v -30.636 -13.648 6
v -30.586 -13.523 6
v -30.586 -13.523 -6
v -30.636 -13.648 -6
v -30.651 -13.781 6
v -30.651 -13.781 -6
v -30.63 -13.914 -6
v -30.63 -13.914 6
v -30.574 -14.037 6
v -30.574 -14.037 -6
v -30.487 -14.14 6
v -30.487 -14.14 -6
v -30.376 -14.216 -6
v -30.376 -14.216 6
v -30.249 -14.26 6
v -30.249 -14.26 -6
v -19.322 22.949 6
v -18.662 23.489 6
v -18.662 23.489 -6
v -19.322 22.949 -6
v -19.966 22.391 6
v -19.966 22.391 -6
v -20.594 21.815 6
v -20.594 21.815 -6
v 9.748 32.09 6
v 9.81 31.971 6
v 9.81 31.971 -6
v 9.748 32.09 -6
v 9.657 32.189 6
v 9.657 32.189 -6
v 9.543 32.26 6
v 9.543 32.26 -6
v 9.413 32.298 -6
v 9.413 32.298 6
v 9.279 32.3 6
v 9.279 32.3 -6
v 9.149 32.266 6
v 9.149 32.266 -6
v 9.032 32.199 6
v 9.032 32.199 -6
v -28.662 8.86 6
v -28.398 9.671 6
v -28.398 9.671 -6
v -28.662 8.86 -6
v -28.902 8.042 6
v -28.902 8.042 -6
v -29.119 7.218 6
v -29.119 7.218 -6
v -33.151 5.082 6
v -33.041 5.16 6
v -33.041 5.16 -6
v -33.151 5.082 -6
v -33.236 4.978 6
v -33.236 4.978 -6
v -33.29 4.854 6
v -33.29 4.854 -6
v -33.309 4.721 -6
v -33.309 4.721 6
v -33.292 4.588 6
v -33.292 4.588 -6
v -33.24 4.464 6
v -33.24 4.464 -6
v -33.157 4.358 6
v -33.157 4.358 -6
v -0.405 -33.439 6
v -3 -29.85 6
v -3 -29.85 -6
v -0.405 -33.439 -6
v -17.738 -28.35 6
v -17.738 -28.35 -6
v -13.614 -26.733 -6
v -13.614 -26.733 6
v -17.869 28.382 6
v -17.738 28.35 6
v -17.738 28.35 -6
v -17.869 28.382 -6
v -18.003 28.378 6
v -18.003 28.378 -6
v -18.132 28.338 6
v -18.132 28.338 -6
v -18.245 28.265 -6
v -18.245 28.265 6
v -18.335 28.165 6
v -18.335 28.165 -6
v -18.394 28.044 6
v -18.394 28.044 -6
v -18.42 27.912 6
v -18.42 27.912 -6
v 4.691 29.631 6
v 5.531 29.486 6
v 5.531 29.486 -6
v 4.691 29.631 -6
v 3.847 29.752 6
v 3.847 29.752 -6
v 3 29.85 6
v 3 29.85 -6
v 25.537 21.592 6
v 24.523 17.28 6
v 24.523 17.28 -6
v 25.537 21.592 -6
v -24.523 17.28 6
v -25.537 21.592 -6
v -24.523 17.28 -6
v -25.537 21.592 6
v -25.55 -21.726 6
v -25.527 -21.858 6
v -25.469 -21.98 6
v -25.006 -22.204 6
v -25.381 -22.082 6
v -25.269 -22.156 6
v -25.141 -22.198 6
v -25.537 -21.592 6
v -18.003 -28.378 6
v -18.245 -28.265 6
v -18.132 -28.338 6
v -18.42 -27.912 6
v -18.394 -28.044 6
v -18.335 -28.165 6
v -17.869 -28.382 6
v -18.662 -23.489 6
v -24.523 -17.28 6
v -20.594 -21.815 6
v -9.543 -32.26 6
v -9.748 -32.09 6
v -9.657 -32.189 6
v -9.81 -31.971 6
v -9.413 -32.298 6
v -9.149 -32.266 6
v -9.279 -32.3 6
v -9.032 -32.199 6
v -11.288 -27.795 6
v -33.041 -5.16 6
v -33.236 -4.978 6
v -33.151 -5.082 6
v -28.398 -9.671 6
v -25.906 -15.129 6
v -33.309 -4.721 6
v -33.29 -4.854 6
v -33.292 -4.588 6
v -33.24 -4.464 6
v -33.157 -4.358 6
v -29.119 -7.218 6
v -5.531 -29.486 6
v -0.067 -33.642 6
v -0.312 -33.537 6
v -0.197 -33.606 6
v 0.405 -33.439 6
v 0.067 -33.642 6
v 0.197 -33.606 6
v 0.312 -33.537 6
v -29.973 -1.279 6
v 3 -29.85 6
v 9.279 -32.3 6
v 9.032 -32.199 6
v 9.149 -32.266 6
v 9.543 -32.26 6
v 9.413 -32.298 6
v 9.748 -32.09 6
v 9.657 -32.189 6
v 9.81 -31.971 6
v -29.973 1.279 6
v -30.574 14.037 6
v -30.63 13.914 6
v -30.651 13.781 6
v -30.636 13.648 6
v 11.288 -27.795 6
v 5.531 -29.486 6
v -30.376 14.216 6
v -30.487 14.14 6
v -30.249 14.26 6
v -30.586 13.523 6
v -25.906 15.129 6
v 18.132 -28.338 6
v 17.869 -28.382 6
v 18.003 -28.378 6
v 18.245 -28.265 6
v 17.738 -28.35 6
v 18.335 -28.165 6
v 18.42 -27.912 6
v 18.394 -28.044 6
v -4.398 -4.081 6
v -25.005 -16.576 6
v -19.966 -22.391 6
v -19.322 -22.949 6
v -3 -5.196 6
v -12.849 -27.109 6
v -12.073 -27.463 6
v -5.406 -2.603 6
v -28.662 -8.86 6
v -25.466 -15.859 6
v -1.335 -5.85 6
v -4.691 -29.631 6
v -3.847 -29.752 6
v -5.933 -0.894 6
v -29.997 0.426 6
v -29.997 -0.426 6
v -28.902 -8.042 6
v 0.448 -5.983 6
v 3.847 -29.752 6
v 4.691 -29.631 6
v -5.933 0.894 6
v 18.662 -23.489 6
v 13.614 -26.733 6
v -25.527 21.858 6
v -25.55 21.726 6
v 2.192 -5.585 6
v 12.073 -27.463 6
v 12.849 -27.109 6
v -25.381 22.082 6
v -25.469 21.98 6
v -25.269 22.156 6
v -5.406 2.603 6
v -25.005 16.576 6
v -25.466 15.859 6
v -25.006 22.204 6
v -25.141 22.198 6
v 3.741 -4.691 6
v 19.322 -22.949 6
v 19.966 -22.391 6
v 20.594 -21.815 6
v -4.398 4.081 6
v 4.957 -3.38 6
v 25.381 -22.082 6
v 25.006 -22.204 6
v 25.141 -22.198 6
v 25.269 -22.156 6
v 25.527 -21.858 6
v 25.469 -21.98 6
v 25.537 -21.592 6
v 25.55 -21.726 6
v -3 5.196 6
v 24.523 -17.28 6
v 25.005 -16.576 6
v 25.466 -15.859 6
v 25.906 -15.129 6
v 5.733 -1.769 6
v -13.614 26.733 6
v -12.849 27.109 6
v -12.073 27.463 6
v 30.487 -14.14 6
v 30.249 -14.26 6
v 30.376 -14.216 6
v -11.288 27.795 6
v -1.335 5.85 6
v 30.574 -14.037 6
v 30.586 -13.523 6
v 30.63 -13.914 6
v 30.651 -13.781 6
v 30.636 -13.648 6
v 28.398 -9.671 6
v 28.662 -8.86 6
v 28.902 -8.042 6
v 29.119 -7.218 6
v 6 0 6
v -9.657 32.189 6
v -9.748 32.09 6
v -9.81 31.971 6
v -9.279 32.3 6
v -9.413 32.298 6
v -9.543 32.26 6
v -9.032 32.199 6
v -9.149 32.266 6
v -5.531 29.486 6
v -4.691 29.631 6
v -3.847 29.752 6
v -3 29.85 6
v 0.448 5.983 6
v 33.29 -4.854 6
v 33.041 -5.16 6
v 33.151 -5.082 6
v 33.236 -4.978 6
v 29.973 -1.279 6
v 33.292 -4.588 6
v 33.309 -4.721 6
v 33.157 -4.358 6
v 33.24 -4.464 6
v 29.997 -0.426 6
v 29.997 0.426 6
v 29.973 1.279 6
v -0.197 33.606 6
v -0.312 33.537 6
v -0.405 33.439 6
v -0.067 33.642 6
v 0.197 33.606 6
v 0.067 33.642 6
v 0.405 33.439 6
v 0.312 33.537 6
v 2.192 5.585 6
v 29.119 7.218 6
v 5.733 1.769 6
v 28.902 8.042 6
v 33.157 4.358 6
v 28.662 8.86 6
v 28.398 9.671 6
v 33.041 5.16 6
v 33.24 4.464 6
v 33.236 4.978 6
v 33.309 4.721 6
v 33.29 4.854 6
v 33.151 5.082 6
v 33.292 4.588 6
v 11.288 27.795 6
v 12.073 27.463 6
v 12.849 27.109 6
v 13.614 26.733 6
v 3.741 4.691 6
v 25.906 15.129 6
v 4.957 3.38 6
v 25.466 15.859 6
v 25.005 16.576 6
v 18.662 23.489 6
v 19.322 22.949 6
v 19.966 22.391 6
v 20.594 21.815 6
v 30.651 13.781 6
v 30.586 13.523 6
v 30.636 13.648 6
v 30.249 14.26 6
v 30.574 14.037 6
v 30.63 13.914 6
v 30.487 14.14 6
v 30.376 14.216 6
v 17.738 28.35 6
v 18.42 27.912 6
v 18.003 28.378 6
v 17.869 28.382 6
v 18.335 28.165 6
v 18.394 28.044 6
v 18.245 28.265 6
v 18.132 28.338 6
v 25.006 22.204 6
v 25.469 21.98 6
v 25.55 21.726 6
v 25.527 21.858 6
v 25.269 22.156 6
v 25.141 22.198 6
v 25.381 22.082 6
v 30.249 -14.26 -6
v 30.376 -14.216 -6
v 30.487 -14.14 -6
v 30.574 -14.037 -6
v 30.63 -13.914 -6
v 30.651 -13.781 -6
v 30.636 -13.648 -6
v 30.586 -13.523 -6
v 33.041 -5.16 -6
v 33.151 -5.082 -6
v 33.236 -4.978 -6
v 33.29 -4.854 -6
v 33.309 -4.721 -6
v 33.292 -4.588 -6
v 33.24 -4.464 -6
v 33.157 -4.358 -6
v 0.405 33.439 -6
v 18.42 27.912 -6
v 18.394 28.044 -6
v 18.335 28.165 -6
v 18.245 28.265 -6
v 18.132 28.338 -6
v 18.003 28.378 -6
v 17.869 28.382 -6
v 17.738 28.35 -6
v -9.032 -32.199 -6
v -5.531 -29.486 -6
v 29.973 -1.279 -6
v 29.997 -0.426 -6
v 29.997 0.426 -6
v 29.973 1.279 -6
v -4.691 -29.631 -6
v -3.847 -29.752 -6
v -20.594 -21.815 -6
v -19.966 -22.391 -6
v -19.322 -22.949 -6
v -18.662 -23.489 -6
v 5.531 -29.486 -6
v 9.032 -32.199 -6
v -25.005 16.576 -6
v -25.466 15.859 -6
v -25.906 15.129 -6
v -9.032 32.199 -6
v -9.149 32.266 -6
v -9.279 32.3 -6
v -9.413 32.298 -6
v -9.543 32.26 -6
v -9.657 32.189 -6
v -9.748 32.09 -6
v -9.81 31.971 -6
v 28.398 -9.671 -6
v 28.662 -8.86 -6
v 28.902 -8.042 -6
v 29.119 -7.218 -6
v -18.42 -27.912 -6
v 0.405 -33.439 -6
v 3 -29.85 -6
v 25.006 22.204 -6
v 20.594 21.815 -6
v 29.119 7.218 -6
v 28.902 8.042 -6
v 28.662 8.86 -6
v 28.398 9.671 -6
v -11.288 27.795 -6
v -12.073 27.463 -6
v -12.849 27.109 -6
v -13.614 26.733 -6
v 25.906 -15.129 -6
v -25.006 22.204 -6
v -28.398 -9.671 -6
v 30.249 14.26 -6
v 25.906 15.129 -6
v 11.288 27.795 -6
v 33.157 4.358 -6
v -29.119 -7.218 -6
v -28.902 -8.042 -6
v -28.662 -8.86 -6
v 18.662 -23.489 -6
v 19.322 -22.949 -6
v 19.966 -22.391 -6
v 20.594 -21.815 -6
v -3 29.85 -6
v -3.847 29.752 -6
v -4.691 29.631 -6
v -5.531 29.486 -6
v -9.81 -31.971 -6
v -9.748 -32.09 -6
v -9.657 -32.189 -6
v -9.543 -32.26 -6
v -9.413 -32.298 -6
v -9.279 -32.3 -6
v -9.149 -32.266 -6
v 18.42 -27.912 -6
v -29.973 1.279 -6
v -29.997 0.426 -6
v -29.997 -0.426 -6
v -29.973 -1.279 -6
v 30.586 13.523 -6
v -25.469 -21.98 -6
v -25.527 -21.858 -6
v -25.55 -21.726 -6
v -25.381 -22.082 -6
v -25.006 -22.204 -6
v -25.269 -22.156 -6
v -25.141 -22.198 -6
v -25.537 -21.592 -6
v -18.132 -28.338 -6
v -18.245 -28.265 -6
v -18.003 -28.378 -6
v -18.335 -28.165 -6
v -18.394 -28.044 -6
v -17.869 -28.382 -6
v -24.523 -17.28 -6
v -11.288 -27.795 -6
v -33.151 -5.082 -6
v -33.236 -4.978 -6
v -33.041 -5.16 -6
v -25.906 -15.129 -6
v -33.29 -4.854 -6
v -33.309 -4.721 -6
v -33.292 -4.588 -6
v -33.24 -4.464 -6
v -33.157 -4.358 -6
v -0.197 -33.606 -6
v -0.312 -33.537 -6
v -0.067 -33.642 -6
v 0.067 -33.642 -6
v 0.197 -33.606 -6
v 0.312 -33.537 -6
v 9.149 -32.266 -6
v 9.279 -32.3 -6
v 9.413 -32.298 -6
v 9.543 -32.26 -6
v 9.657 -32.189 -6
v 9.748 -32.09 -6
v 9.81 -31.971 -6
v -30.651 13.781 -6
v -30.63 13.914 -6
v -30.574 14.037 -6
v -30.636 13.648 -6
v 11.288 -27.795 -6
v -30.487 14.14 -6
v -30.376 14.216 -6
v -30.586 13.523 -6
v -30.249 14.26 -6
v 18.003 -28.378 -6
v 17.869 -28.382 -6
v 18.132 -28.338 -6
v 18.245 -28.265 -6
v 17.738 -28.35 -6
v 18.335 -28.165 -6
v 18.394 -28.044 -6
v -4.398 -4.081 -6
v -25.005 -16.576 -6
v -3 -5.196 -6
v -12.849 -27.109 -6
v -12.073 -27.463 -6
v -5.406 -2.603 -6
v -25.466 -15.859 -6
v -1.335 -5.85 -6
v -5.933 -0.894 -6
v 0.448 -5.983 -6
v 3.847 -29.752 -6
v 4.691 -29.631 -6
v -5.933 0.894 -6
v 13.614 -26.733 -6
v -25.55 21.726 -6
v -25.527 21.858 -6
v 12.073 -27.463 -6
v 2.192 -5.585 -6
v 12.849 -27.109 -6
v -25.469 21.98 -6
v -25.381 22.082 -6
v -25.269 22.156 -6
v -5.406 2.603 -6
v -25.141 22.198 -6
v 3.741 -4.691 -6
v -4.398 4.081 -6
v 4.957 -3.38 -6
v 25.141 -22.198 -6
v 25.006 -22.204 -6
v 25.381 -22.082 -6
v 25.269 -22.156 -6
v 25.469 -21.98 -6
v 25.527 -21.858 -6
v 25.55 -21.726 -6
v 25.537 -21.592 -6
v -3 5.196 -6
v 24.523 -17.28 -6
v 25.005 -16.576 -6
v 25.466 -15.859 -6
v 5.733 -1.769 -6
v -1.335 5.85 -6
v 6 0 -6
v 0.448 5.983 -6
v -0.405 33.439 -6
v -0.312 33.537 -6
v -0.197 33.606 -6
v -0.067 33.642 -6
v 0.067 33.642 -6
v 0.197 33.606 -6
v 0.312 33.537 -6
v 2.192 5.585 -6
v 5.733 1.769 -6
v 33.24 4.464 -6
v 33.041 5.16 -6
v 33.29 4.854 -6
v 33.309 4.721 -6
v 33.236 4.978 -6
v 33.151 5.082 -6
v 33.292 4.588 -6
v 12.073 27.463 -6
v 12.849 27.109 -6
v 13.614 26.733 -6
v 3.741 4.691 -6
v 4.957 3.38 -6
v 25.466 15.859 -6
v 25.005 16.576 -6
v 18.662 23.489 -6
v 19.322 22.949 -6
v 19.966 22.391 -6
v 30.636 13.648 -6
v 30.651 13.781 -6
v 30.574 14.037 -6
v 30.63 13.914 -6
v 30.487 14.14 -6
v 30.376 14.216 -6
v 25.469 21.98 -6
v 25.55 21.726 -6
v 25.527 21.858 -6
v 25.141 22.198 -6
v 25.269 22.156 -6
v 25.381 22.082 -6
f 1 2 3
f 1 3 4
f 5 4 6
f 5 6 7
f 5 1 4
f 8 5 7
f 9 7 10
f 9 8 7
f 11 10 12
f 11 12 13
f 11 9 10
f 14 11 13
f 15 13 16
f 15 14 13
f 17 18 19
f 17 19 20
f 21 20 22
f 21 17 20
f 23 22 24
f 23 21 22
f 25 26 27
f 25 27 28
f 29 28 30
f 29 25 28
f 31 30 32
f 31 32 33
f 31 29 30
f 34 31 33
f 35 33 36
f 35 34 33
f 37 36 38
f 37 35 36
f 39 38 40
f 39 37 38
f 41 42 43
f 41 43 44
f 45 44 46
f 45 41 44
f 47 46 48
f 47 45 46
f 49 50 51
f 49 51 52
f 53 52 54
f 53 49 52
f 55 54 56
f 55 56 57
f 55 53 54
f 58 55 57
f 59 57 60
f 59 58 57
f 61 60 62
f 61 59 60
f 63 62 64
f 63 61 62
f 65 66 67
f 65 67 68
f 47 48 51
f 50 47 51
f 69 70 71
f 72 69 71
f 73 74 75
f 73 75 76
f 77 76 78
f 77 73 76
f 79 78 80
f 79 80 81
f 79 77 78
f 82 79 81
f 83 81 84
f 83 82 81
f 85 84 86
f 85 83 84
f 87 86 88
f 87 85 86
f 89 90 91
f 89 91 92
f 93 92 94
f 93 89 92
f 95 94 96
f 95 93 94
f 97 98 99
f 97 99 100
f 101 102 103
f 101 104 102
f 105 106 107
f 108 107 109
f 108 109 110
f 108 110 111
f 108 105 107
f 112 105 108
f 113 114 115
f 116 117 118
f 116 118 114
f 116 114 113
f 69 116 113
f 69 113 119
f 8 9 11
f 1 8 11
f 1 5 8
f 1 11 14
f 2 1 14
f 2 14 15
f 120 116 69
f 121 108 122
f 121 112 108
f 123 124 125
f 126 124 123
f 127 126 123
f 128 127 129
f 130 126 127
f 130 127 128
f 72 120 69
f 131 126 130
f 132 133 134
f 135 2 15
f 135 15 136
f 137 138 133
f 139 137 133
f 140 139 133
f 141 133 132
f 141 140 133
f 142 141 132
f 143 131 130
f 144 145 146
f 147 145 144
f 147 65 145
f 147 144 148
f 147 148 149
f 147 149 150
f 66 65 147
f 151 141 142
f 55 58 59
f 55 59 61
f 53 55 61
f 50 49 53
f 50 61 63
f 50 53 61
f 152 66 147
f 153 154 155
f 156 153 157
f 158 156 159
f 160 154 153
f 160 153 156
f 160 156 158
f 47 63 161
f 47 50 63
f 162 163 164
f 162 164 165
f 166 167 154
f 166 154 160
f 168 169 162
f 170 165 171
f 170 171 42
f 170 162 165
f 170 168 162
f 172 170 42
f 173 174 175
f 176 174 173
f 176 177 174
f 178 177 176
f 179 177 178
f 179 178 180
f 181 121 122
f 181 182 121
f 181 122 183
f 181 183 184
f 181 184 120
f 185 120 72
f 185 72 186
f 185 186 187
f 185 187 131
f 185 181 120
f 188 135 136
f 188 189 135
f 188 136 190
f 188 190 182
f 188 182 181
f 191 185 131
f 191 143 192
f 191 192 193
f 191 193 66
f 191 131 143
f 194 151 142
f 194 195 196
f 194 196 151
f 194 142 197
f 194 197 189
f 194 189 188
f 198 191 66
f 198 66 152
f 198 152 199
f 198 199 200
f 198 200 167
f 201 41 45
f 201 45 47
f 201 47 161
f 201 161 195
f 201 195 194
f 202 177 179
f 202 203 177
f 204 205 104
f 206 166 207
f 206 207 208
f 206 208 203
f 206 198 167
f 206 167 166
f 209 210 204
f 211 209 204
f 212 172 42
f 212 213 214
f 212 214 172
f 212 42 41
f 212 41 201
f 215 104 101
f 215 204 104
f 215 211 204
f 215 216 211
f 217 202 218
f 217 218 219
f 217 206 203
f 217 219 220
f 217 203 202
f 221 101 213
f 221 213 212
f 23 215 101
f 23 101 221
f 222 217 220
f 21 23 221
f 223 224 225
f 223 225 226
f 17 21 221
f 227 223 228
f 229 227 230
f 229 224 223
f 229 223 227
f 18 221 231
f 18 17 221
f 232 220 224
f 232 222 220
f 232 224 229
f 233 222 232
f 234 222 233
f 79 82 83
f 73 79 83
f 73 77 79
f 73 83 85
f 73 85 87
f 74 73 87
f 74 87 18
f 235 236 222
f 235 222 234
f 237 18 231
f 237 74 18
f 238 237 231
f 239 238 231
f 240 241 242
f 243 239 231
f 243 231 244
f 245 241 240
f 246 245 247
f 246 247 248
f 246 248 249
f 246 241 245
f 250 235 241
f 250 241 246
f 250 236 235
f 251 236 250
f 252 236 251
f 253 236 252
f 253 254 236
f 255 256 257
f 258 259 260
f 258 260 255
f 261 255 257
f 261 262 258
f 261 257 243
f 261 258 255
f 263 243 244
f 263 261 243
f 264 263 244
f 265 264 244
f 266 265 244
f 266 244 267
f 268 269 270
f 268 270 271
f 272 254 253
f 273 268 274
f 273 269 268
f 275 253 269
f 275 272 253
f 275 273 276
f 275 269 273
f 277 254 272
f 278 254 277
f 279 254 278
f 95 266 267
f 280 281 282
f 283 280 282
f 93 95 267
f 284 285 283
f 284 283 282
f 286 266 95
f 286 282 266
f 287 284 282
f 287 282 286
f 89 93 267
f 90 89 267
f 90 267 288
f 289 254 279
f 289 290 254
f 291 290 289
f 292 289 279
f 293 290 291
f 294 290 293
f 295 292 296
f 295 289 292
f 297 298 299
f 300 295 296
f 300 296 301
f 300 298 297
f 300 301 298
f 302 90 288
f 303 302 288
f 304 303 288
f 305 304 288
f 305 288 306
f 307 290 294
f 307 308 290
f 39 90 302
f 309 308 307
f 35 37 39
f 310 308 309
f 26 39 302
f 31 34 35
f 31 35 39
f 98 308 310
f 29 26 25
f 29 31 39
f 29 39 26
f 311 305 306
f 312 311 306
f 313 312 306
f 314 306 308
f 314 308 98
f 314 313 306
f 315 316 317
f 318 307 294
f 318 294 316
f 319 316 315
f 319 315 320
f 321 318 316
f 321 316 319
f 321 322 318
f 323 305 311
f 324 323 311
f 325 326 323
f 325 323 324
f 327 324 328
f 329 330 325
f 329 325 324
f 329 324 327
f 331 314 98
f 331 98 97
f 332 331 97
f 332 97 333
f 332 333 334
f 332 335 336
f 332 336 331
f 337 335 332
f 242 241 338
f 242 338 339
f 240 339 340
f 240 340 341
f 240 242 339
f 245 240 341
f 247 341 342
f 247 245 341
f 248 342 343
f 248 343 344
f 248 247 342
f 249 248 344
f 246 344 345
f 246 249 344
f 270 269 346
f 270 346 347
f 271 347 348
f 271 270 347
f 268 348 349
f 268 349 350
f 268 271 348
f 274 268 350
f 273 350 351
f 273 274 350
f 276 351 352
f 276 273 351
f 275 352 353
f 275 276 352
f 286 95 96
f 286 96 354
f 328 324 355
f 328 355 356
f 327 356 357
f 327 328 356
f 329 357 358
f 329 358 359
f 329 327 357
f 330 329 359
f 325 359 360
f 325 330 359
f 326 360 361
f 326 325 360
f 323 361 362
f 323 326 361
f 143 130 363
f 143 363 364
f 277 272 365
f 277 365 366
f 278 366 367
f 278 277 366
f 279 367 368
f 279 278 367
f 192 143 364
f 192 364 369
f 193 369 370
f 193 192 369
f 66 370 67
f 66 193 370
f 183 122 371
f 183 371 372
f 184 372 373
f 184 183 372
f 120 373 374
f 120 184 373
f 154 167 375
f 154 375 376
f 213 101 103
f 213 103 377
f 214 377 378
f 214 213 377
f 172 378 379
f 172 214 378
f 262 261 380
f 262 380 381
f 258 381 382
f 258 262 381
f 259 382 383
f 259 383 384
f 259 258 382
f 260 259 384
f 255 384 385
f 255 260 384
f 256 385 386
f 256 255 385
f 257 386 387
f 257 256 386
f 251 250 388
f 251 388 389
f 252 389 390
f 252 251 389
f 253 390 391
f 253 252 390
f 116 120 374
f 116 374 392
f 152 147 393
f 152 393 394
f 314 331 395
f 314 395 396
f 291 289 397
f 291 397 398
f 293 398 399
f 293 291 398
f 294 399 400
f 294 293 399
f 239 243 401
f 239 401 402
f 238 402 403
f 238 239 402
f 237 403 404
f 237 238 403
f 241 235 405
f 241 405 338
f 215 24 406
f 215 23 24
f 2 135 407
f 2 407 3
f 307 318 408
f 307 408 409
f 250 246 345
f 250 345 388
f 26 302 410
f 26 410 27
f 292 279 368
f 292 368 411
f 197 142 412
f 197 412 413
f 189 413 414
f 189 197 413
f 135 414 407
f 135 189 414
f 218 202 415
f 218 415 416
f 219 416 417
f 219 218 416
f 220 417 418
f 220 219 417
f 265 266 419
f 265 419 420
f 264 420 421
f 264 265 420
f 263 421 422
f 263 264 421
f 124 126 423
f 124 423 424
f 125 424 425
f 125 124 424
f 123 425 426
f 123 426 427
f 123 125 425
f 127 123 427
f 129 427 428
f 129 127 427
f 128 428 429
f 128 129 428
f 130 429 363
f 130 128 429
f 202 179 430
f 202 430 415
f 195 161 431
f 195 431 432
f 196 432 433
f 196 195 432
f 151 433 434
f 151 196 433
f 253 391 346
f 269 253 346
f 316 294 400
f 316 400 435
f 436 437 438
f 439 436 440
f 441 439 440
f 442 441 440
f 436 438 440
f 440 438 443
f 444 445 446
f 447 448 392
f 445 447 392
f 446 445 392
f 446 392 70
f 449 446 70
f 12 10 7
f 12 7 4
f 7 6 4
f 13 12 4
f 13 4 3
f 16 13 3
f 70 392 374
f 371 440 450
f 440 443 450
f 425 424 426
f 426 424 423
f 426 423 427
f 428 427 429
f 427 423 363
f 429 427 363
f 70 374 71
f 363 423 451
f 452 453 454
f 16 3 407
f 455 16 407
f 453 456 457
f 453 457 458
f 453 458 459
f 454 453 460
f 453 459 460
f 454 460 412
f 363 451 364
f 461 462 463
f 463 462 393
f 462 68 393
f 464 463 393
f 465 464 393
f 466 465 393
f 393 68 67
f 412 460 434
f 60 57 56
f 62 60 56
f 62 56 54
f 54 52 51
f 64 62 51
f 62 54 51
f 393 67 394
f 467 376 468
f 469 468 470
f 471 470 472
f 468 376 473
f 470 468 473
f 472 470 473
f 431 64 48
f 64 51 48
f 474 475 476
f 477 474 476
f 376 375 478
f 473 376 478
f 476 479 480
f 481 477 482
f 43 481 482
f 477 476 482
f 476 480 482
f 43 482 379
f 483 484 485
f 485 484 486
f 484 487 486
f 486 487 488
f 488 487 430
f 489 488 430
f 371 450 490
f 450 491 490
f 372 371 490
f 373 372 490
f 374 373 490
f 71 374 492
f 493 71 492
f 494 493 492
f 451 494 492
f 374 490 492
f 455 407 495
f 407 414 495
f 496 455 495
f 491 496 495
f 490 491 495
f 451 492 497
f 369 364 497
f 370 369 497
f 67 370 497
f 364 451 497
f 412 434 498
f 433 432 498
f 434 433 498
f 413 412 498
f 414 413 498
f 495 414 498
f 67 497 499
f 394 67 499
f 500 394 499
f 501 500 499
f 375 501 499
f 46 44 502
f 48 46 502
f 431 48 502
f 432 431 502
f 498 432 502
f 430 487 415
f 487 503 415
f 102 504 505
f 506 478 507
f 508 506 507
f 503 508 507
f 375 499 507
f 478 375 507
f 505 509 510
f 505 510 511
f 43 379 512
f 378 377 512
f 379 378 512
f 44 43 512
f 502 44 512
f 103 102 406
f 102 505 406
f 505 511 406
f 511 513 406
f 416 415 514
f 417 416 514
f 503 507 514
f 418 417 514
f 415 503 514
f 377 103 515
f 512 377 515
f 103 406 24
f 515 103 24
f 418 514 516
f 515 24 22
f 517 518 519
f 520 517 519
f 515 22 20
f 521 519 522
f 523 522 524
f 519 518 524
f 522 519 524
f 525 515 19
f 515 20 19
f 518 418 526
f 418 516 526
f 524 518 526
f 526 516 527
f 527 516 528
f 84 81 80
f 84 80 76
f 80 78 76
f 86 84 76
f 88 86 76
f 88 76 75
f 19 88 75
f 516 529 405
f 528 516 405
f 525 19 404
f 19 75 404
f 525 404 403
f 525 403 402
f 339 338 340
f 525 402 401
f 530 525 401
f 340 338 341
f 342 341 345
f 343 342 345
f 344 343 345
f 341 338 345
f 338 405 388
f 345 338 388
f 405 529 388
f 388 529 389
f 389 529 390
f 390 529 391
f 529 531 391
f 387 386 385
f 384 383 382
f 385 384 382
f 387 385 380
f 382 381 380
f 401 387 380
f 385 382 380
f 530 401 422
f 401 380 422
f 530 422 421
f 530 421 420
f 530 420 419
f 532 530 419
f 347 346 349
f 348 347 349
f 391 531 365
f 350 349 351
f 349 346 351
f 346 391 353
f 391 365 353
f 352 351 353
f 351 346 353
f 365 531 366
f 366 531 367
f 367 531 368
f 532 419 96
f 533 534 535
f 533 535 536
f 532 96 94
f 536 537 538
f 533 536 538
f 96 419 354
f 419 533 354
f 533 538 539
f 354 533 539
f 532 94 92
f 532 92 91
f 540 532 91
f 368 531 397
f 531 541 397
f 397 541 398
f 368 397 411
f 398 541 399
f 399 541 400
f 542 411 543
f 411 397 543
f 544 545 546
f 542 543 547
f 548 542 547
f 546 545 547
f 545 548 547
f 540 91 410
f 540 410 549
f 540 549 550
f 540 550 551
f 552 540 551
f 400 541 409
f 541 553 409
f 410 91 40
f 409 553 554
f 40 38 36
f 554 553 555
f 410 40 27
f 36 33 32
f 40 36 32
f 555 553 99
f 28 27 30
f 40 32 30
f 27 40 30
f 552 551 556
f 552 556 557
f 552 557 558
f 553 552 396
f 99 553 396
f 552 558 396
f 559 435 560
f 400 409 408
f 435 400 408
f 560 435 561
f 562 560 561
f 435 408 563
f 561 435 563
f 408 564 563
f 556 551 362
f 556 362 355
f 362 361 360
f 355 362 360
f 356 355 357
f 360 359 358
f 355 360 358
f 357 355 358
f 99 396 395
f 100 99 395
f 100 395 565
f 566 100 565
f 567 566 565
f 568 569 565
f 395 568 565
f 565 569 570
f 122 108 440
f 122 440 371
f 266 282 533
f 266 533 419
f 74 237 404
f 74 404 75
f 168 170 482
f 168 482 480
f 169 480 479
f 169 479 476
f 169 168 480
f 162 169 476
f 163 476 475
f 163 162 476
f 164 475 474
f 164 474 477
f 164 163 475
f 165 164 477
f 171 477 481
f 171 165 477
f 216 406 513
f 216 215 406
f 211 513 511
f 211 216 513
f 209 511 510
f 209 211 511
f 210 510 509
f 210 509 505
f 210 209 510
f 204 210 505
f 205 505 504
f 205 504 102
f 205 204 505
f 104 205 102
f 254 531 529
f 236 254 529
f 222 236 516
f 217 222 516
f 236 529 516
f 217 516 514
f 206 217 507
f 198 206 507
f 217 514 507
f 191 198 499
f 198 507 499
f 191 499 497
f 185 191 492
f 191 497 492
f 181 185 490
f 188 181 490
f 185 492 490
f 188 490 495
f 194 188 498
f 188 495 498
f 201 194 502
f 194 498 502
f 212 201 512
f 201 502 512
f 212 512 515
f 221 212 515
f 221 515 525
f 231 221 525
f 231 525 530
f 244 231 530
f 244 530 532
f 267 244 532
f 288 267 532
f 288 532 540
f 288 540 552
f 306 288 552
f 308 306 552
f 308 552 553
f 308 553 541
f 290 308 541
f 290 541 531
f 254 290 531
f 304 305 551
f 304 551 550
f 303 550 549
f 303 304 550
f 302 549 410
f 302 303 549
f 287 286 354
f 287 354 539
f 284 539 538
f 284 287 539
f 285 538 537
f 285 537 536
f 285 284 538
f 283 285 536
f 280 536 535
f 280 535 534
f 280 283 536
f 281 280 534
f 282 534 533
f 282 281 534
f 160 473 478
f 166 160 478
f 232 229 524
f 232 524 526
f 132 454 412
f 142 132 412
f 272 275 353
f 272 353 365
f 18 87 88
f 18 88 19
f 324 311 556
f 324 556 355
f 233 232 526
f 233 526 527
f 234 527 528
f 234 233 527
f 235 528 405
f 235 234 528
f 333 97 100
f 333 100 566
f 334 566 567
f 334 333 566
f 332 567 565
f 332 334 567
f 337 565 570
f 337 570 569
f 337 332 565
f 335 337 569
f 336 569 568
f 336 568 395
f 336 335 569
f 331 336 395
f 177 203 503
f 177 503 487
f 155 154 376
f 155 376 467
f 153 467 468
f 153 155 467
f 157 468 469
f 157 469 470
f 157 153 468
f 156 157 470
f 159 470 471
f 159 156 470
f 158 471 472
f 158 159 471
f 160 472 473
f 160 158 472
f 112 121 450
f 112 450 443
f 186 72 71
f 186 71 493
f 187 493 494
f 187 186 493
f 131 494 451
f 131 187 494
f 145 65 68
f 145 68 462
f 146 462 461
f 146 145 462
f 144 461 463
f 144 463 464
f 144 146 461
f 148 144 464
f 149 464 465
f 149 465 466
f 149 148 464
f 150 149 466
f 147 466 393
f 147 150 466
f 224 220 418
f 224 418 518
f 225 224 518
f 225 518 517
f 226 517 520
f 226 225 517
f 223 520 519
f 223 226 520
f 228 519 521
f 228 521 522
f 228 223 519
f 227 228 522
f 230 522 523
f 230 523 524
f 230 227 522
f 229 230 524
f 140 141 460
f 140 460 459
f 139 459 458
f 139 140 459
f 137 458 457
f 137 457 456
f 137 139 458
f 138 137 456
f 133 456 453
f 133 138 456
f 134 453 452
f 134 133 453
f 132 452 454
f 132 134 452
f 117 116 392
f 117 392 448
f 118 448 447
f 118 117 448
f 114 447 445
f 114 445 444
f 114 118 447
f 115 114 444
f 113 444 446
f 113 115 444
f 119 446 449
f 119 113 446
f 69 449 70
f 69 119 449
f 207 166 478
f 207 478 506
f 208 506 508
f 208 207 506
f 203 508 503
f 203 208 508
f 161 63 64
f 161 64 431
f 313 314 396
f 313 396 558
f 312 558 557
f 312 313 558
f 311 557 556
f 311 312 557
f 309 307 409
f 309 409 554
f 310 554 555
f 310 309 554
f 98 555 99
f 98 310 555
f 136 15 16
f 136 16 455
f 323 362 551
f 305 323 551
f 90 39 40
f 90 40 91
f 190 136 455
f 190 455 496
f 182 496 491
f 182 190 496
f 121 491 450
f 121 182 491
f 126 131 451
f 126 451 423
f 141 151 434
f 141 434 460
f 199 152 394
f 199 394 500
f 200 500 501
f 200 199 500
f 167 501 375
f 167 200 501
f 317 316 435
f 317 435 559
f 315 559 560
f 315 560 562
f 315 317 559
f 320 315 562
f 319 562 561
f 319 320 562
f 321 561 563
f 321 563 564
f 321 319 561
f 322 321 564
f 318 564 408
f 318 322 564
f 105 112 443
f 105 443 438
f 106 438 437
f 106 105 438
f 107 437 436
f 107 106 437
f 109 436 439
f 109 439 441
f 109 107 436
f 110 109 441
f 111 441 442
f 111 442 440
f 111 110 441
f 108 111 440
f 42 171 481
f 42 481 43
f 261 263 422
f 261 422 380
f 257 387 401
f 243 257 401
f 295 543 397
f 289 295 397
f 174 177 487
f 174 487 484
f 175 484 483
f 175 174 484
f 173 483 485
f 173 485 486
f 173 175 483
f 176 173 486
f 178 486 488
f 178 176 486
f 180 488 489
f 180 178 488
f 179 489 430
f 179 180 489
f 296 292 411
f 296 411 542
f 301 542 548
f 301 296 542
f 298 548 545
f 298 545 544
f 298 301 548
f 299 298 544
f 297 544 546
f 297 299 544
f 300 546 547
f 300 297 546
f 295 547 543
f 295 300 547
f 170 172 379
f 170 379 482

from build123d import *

# Parameters (mm, degrees)
F1_DEPTH = 6
F2_R     = 6
F3_DEPTH = 25


with BuildPart() as f1:
    # F0 (on Top) → F1 (new body, symmetric)
    with BuildSketch(Plane.XY):
        with BuildLine():
            Line((-25.53717, 21.591896), (-24.523422, 17.280097))
            ThreePointArc((-24.523422, 17.280097), (-25.237606, 16.219225), (-25.905927, 15.128878))
            Line((-25.905927, 15.128878), (-30.249203, 14.259829))
            ThreePointArc((-30.249203, 14.259829), (-30.605918, 13.977255), (-30.585875, 13.52262))
            Line((-30.585875, 13.52262), (-28.398417, 9.671086))
            ThreePointArc((-28.398417, 9.671086), (-28.784789, 8.451977), (-29.118852, 7.217509))
            Line((-29.118852, 7.217509), (-33.041356, 5.16002))
            ThreePointArc((-33.041356, 5.16002), (-33.304011, 4.788394), (-33.156694, 4.357822))
            Line((-33.156694, 4.357822), (-29.972742, 1.27858))
            ThreePointArc((-29.972742, 1.27858), (-30, 0), (-29.972742, -1.27858))
            Line((-29.972742, -1.27858), (-33.156694, -4.357822))
            ThreePointArc((-33.156694, -4.357822), (-33.304011, -4.788394), (-33.041356, -5.16002))
            Line((-33.041356, -5.16002), (-29.118852, -7.217509))
            ThreePointArc((-29.118852, -7.217509), (-28.784789, -8.451977), (-28.398417, -9.671086))
            Line((-28.398417, -9.671086), (-30.585875, -13.52262))
            ThreePointArc((-30.585875, -13.52262), (-30.605918, -13.977255), (-30.249203, -14.259829))
            Line((-30.249203, -14.259829), (-25.905927, -15.128878))
            ThreePointArc((-25.905927, -15.128878), (-25.237606, -16.219225), (-24.523422, -17.280097))
            Line((-24.523422, -17.280097), (-25.53717, -21.591896))
            ThreePointArc((-25.53717, -21.591896), (-25.428316, -22.033761), (-25.00644, -22.204391))
            Line((-25.00644, -22.204391), (-20.594258, -21.814595))
            ThreePointArc((-20.594258, -21.814595), (-19.645822, -22.672487), (-18.661685, -23.489178))
            Line((-18.661685, -23.489178), (-18.419595, -27.911925))
            ThreePointArc((-18.419595, -27.911925), (-18.190663, -28.305223), (-17.737803, -28.350085))
            Line((-17.737803, -28.350085), (-13.614164, -26.733023))
            ThreePointArc((-13.614164, -26.733023), (-12.46245, -27.28896), (-11.28809, -27.795306))
            Line((-11.28809, -27.795306), (-9.809774, -31.970695))
            ThreePointArc((-9.809774, -31.970695), (-9.47931, -32.283565), (-9.032156, -32.199024))
            Line((-9.032156, -32.199024), (-5.531132, -29.485701))
            ThreePointArc((-5.531132, -29.485701), (-4.269445, -29.694643), (-3, -29.849623))
            Line((-3, -29.849623), (-0.405223, -33.43939))
            ThreePointArc((-0.405223, -33.43939), (0, -33.646484), (0.405223, -33.43939))
            Line((0.405223, -33.43939), (3, -29.849623))
            ThreePointArc((3, -29.849623), (4.269445, -29.694643), (5.531132, -29.485701))
            Line((5.531132, -29.485701), (9.032156, -32.199024))
            ThreePointArc((9.032156, -32.199024), (9.47931, -32.283565), (9.809774, -31.970695))
            Line((9.809774, -31.970695), (11.28809, -27.795306))
            ThreePointArc((11.28809, -27.795306), (12.46245, -27.28896), (13.614164, -26.733023))
            Line((13.614164, -26.733023), (17.737803, -28.350085))
            ThreePointArc((17.737803, -28.350085), (18.190663, -28.305223), (18.419595, -27.911925))
            Line((18.419595, -27.911925), (18.661685, -23.489178))
            ThreePointArc((18.661685, -23.489178), (19.645822, -22.672487), (20.594258, -21.814595))
            Line((20.594258, -21.814595), (25.00644, -22.204391))
            ThreePointArc((25.00644, -22.204391), (25.428316, -22.033761), (25.53717, -21.591896))
            Line((25.53717, -21.591896), (24.523422, -17.280097))
            ThreePointArc((24.523422, -17.280097), (25.237606, -16.219225), (25.905927, -15.128878))
            Line((25.905927, -15.128878), (30.249203, -14.259829))
            ThreePointArc((30.249203, -14.259829), (30.605918, -13.977255), (30.585875, -13.52262))
            Line((30.585875, -13.52262), (28.398417, -9.671086))
            ThreePointArc((28.398417, -9.671086), (28.784789, -8.451977), (29.118852, -7.217509))
            Line((29.118852, -7.217509), (33.041356, -5.16002))
            ThreePointArc((33.041356, -5.16002), (33.304011, -4.788394), (33.156694, -4.357822))
            Line((33.156694, -4.357822), (29.972742, -1.27858))
            ThreePointArc((29.972742, -1.27858), (30, 0), (29.972742, 1.27858))
            Line((29.972742, 1.27858), (33.156694, 4.357822))
            ThreePointArc((33.156694, 4.357822), (33.304011, 4.788394), (33.041356, 5.16002))
            Line((33.041356, 5.16002), (29.118852, 7.217509))
            ThreePointArc((29.118852, 7.217509), (28.784789, 8.451977), (28.398417, 9.671086))
            Line((28.398417, 9.671086), (30.585875, 13.52262))
            ThreePointArc((30.585875, 13.52262), (30.605918, 13.977255), (30.249203, 14.259829))
            Line((30.249203, 14.259829), (25.905927, 15.128878))
            ThreePointArc((25.905927, 15.128878), (25.237606, 16.219225), (24.523422, 17.280097))
            Line((24.523422, 17.280097), (25.53717, 21.591896))
            ThreePointArc((25.53717, 21.591896), (25.428316, 22.033761), (25.00644, 22.204391))
            Line((25.00644, 22.204391), (20.594258, 21.814595))
            ThreePointArc((20.594258, 21.814595), (19.645822, 22.672487), (18.661685, 23.489178))
            Line((18.661685, 23.489178), (18.419595, 27.911925))
            ThreePointArc((18.419595, 27.911925), (18.190663, 28.305223), (17.737803, 28.350085))
            Line((17.737803, 28.350085), (13.614164, 26.733023))
            ThreePointArc((13.614164, 26.733023), (12.46245, 27.28896), (11.28809, 27.795306))
            Line((11.28809, 27.795306), (9.809774, 31.970695))
            ThreePointArc((9.809774, 31.970695), (9.47931, 32.283565), (9.032156, 32.199024))
            Line((9.032156, 32.199024), (5.531132, 29.485701))
            ThreePointArc((5.531132, 29.485701), (4.269445, 29.694643), (3, 29.849623))
            Line((3, 29.849623), (0.405223, 33.43939))
            ThreePointArc((0.405223, 33.43939), (0, 33.646484), (-0.405223, 33.43939))
            Line((-0.405223, 33.43939), (-3, 29.849623))
            ThreePointArc((-3, 29.849623), (-4.269445, 29.694643), (-5.531132, 29.485701))
            Line((-5.531132, 29.485701), (-9.032156, 32.199024))
            ThreePointArc((-9.032156, 32.199024), (-9.47931, 32.283565), (-9.809774, 31.970695))
            Line((-9.809774, 31.970695), (-11.28809, 27.795306))
            ThreePointArc((-11.28809, 27.795306), (-12.46245, 27.28896), (-13.614164, 26.733023))
            Line((-13.614164, 26.733023), (-17.737803, 28.350085))
            ThreePointArc((-17.737803, 28.350085), (-18.190663, 28.305223), (-18.419595, 27.911925))
            Line((-18.419595, 27.911925), (-18.661685, 23.489178))
            ThreePointArc((-18.661685, 23.489178), (-19.645822, 22.672487), (-20.594258, 21.814595))
            Line((-20.594258, 21.814595), (-25.00644, 22.204391))
            ThreePointArc((-25.00644, 22.204391), (-25.428316, 22.033761), (-25.53717, 21.591896))
        make_face()
    extrude(amount=F1_DEPTH, both=True)

    # F2 (on face) → F3 (cut)
    with BuildSketch(Plane(origin=(0, 0, -6), x_dir=(1, 0, 0), z_dir=(0, 0, -1))):
        Circle(F2_R)
    extrude(amount=-F3_DEPTH, mode=Mode.SUBTRACT)


solid = f1.part
